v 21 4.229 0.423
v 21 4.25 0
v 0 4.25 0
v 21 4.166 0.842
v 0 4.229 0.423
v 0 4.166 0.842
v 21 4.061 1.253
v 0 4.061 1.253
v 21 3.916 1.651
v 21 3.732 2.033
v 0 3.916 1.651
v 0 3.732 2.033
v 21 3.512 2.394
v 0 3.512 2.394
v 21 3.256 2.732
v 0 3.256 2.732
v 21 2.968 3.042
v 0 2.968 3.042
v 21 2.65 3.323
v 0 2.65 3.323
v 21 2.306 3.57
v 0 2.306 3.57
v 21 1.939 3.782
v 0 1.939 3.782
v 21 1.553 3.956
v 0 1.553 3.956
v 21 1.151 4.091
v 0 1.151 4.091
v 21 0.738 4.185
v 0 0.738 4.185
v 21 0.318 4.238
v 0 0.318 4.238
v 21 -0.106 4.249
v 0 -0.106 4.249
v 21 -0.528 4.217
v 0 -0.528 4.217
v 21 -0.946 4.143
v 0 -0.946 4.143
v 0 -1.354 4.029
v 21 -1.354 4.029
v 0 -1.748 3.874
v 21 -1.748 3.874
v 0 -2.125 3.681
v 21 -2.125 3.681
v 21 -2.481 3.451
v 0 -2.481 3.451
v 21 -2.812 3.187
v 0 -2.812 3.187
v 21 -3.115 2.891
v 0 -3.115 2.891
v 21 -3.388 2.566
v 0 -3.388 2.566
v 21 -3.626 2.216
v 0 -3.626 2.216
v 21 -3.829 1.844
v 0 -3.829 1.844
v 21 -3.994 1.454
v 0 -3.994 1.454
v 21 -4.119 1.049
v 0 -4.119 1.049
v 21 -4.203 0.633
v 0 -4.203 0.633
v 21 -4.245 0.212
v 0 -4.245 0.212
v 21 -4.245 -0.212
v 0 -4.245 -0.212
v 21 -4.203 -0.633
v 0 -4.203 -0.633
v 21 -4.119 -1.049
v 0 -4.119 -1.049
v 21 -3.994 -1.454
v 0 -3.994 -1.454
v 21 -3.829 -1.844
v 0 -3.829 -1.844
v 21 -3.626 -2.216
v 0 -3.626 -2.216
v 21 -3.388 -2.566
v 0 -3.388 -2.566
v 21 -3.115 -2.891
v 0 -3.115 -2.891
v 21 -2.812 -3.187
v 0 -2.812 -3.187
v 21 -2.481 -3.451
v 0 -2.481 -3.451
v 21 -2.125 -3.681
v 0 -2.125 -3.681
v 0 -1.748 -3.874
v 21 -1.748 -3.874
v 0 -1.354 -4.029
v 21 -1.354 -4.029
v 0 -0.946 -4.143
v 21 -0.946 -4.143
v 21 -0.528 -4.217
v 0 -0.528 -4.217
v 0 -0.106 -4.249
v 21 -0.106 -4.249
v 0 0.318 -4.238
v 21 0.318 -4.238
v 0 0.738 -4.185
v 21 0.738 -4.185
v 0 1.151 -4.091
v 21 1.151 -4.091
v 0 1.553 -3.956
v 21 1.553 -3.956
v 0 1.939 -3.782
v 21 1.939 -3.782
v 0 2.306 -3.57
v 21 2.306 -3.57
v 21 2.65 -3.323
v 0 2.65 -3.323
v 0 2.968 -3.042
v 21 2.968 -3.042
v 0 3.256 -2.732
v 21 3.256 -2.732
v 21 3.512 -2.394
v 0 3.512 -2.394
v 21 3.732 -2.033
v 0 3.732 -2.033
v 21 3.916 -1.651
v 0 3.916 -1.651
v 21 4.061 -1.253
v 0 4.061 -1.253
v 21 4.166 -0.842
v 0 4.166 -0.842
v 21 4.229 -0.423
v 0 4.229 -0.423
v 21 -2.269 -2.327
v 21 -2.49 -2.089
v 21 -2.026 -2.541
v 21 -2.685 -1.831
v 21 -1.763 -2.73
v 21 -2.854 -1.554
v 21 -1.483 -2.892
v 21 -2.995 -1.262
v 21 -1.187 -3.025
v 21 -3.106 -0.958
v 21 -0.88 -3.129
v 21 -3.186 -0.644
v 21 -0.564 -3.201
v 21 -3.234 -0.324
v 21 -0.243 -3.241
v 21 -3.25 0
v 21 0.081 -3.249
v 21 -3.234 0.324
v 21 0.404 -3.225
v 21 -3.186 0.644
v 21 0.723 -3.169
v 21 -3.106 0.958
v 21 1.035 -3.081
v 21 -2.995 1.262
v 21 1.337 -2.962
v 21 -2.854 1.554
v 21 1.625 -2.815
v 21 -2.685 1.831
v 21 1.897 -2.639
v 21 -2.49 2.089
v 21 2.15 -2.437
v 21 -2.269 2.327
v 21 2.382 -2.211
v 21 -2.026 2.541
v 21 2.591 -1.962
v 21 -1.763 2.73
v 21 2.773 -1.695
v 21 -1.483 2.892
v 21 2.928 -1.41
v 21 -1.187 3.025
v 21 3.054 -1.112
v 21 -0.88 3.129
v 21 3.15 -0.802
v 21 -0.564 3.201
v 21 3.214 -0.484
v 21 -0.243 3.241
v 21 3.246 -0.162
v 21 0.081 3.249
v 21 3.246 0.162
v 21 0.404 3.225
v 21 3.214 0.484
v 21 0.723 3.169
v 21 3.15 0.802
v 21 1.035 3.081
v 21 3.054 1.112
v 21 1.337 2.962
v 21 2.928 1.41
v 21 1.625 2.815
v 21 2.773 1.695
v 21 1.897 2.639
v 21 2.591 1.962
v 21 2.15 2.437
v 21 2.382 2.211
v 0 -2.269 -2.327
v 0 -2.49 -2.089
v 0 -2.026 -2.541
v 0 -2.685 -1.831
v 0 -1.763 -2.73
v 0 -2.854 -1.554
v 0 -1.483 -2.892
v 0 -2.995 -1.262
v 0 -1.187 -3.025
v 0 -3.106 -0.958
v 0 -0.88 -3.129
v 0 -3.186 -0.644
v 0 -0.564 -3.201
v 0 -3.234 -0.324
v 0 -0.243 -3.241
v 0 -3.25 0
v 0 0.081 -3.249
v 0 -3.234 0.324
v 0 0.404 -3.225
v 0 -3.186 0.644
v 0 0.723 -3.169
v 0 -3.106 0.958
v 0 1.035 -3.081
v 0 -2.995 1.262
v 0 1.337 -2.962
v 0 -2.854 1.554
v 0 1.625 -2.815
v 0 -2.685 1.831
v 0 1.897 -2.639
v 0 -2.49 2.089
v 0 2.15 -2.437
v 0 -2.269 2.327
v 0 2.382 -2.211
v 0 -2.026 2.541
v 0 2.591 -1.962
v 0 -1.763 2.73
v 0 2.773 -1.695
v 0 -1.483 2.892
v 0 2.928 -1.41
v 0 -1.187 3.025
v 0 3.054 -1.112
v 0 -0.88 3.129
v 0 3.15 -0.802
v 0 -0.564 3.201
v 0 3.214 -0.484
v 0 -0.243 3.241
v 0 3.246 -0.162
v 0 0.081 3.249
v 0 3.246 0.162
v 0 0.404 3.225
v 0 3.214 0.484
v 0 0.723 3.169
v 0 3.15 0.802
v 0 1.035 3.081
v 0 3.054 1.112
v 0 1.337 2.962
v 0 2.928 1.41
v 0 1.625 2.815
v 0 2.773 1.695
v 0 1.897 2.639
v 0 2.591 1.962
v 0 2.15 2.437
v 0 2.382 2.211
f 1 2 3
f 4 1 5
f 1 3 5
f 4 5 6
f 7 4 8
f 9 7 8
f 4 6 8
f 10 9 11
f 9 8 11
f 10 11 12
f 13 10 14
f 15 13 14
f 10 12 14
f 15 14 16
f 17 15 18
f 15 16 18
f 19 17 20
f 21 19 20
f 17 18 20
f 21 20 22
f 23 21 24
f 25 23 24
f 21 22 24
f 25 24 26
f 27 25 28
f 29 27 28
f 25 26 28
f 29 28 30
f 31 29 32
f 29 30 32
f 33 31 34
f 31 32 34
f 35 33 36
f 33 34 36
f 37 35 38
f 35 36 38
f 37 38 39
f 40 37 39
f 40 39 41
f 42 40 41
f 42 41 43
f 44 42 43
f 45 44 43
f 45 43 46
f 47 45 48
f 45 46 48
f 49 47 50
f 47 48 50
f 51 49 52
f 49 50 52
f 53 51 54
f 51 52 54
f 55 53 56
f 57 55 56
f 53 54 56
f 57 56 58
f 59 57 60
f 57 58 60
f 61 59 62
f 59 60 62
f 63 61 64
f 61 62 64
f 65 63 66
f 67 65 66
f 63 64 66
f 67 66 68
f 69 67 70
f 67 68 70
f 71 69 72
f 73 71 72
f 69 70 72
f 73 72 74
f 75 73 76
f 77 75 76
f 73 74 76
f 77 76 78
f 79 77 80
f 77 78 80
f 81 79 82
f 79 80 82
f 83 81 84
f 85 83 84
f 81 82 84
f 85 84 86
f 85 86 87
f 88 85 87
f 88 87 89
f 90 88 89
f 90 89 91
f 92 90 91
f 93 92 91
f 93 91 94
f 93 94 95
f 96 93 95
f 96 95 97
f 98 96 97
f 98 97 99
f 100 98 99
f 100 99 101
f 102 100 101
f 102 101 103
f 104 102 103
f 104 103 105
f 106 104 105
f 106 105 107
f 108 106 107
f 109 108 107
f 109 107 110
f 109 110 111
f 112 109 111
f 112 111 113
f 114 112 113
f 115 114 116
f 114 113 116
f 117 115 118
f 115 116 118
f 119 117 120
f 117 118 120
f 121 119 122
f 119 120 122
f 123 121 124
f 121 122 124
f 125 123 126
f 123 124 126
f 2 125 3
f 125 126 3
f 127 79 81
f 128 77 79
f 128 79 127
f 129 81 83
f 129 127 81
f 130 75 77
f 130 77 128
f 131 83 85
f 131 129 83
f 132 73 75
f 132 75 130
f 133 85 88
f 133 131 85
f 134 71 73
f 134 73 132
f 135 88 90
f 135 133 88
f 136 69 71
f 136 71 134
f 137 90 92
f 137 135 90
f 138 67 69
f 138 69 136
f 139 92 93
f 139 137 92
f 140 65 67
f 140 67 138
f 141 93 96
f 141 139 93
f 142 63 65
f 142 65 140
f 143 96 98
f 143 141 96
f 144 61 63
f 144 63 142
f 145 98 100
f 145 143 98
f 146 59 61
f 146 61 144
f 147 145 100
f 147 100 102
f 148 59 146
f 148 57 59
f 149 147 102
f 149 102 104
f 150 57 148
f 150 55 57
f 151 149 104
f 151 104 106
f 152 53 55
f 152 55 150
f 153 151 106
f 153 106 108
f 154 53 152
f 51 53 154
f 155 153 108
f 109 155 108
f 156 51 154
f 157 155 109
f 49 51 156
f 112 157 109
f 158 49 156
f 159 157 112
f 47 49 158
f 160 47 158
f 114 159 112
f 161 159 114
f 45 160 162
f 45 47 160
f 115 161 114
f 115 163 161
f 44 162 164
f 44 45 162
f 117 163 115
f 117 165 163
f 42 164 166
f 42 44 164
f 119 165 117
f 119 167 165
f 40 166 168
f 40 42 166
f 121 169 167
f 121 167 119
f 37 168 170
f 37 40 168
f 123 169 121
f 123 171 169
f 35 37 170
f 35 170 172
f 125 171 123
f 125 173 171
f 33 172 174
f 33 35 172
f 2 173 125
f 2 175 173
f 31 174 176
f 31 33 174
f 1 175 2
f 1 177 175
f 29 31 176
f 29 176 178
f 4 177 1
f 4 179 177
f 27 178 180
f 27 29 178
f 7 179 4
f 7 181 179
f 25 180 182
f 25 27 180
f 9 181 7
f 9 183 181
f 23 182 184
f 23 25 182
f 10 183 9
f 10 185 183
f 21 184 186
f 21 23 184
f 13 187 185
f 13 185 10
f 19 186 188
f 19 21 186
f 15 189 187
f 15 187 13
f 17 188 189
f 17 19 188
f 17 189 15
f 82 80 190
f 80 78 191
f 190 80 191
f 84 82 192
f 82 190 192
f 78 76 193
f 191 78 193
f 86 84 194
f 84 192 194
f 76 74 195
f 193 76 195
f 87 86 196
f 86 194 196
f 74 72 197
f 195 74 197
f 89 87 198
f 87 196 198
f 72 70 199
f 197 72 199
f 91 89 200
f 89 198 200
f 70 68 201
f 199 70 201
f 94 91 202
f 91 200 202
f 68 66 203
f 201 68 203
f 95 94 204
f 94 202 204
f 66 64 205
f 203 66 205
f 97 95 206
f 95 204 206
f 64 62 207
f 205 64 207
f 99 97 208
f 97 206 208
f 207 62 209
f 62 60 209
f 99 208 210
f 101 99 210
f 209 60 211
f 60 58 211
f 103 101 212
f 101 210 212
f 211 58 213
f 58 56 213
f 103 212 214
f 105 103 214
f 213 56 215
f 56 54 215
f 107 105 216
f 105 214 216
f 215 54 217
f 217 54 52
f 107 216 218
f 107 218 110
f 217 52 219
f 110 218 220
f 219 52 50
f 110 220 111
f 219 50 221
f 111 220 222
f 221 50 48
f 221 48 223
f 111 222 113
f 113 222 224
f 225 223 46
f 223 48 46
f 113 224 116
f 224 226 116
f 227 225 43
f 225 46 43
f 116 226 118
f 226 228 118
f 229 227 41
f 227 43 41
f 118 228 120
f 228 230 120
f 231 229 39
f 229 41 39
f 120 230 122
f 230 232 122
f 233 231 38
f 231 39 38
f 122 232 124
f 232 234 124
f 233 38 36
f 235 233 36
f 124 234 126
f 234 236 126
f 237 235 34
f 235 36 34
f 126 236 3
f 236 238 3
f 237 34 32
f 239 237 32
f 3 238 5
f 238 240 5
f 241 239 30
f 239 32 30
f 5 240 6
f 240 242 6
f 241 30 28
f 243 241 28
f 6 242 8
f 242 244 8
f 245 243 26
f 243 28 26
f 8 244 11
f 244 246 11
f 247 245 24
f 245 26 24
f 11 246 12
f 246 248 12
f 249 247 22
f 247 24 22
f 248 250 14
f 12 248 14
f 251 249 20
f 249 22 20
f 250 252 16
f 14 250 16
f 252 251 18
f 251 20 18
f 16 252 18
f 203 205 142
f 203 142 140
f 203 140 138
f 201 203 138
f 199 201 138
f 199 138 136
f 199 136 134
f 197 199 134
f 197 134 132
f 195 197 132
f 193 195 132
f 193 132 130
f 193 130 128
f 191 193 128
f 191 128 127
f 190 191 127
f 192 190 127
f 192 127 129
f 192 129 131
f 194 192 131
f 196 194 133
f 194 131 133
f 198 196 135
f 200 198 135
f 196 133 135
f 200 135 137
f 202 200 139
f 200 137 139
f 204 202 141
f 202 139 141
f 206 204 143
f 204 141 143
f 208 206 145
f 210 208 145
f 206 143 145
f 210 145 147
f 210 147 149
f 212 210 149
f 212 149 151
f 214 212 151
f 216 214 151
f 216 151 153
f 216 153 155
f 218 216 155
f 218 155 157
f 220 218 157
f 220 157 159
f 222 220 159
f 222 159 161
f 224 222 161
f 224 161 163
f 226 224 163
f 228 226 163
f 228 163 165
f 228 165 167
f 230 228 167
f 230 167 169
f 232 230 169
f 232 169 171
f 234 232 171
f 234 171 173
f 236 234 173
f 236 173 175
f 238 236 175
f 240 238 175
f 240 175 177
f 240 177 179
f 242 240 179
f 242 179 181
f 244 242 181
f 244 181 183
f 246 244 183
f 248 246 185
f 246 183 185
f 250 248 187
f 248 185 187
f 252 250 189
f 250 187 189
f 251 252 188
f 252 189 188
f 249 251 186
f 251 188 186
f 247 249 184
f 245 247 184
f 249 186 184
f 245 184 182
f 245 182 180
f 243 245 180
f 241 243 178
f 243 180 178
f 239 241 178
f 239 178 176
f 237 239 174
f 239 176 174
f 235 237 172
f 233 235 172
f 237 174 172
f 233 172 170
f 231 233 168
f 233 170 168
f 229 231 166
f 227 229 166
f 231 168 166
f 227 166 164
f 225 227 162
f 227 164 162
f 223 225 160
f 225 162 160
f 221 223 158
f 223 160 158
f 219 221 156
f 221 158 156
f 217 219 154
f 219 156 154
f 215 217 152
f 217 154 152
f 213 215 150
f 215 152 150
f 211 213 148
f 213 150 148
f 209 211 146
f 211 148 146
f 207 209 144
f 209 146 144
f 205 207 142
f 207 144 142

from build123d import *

# Parameters (mm, degrees)
F0_R     = 4.25
F1_DEPTH = 21
F2_R     = 4.25
F3_DEPTH = 21
F5_D     = 8.4
F4_R     = 4.2
F7_DEPTH = 21
F8_D     = 6.5


# Not quite as in the source:
# - a feature names something its author has since deleted; it is built from what else it names


with BuildPart() as f1:
    # F0 (on Right) → F1 (new body)
    with BuildSketch(Plane.YZ):
        Circle(F0_R)
    extrude(amount=F1_DEPTH)

    # F2 (on Right) → F3 (join)
    with BuildSketch(Plane.YZ):
        Circle(F2_R)
    extrude(amount=F3_DEPTH)

    # F5 (through all)
    with Locations(Plane(origin=(0, 0, 0), x_dir=(0, 1, 0), z_dir=(-1, 0, 0))):
        with Locations((0, 0)):
            Hole(F5_D / 2)

    # F4 (on face) → F7 (join)
    with BuildSketch(Plane.YZ):
        Circle(F4_R)
    extrude(amount=F7_DEPTH)

    # F8 (through all)
    with Locations(Plane(origin=(0, 0, 0), x_dir=(0, 1, 0), z_dir=(-1, 0, 0))):
        with Locations((0, 0)):
            Hole(F8_D / 2)


solid = f1.part
